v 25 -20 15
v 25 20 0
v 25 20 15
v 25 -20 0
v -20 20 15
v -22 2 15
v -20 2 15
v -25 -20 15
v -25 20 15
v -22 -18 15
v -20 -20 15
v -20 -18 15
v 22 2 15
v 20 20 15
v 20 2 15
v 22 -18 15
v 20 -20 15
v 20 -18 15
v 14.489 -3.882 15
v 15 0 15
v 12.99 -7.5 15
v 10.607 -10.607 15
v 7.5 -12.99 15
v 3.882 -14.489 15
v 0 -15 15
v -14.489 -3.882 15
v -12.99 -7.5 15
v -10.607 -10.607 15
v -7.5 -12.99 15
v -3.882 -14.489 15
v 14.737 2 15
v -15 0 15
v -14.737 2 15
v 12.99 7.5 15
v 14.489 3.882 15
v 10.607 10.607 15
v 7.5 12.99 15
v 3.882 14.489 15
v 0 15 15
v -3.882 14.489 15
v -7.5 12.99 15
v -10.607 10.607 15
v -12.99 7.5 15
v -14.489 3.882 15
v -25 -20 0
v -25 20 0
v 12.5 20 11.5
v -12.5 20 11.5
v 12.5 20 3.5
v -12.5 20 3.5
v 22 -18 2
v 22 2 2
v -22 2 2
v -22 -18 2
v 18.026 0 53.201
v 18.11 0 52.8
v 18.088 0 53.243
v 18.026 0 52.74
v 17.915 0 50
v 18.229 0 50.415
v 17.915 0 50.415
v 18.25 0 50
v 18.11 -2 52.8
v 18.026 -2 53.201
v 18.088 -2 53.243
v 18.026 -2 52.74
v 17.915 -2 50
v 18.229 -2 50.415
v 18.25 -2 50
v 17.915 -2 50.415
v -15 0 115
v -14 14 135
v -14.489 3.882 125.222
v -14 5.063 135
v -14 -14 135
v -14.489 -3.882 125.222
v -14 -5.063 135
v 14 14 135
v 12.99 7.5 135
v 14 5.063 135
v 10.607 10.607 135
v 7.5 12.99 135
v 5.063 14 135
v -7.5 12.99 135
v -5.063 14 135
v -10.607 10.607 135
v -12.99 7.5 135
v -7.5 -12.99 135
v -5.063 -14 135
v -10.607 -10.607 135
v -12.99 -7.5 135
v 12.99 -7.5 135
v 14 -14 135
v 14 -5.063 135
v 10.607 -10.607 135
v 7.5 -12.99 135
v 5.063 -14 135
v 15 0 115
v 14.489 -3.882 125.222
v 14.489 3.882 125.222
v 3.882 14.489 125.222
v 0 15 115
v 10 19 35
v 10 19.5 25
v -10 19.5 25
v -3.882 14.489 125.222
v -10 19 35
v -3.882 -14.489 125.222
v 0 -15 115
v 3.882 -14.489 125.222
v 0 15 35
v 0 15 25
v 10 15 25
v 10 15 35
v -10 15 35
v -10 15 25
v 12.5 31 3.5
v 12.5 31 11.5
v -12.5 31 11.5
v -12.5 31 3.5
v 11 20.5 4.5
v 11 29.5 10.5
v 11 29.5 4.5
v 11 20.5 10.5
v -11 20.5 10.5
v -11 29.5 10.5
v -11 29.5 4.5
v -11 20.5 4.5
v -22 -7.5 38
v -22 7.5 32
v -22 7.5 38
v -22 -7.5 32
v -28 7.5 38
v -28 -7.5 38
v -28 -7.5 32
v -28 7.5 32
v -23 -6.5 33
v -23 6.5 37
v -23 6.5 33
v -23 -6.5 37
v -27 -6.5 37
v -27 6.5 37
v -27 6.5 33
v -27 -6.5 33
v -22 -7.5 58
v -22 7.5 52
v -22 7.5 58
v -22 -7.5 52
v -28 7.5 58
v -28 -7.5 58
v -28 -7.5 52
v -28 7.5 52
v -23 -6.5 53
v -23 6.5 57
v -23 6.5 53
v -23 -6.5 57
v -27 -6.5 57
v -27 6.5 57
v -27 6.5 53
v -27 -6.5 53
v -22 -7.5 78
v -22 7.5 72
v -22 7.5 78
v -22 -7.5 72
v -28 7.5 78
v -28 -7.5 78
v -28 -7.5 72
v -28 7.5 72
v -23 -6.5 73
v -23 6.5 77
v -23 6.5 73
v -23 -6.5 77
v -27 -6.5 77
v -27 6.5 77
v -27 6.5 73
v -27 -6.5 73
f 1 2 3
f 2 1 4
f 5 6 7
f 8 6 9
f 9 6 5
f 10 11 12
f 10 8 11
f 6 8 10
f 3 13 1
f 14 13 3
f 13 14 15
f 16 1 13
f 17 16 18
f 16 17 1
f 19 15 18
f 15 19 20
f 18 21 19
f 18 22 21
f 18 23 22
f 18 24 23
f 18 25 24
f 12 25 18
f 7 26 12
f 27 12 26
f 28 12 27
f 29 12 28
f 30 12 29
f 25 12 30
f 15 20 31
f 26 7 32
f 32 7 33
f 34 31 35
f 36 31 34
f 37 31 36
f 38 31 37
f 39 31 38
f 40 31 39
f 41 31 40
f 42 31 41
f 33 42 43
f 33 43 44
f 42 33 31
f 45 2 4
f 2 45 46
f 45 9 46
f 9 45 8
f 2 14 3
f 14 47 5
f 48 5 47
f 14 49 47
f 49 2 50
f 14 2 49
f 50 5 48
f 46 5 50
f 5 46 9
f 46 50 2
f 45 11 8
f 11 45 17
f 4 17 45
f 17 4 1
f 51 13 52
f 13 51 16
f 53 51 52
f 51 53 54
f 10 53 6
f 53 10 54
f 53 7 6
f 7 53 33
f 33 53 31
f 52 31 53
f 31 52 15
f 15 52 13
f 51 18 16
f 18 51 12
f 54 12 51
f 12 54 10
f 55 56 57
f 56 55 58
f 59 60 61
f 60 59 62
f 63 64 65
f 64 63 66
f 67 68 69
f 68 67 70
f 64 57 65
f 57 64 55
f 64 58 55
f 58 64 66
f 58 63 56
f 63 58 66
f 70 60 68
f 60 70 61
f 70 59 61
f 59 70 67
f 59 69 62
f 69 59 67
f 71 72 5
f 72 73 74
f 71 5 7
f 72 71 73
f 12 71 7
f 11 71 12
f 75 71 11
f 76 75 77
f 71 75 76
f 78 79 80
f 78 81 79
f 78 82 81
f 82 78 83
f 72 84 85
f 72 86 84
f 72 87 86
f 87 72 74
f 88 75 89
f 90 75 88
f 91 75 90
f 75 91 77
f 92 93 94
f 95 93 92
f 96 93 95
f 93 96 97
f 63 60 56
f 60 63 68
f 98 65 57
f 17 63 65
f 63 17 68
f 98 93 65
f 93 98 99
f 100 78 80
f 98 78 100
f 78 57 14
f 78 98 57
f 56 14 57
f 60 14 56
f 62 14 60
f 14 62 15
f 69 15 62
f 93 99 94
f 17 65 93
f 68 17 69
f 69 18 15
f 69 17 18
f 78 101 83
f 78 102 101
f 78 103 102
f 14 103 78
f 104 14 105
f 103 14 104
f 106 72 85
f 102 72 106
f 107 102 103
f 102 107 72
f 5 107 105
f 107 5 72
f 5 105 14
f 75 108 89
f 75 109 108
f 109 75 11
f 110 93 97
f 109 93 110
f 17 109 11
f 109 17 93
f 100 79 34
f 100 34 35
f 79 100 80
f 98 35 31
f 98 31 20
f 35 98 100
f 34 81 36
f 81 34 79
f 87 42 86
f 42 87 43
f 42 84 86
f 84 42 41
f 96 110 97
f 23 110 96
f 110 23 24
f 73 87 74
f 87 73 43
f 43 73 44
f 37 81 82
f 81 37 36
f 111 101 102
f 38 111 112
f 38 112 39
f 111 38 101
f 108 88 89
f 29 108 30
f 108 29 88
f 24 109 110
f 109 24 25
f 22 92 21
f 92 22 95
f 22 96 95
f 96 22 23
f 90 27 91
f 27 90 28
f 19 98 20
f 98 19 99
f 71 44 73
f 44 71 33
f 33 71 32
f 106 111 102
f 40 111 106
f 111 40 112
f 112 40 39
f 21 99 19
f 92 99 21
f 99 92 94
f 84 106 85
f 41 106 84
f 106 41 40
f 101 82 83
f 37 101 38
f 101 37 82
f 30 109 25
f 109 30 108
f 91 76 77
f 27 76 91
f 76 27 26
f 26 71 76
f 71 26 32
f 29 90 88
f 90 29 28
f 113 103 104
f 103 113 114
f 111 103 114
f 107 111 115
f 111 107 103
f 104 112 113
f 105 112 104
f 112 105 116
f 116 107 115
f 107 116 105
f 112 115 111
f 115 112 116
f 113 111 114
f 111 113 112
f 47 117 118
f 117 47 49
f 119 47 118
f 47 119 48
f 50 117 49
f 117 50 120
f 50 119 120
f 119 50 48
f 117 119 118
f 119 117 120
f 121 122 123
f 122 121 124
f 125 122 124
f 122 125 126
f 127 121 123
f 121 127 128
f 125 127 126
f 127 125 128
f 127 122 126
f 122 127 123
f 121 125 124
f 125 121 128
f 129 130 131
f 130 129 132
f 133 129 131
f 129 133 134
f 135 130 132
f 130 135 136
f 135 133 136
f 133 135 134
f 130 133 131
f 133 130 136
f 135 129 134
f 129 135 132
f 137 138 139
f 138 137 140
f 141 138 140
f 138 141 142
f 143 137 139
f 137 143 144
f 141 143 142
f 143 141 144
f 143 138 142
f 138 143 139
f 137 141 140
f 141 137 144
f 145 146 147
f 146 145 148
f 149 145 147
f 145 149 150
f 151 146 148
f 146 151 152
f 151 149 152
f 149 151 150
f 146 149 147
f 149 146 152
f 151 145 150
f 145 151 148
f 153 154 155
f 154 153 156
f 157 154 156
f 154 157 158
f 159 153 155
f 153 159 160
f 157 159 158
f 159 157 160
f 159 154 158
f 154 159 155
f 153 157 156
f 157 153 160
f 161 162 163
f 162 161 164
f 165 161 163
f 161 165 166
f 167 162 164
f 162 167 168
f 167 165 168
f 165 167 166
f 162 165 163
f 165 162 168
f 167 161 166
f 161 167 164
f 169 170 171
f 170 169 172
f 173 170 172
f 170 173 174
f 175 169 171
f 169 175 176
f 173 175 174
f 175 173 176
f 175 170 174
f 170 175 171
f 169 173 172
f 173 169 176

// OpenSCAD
// SIMPLE WORKING DICE TOWER + INITIATIVE TRACKER
// Basic, guaranteed-to-work design

// Basic dimensions
TOWER_HEIGHT = 120;
BASE_SIZE = 40;
BASE_HEIGHT = 15;
DICE_PATH = 30;  // Internal diameter for dice

$fn = 24; // Low resolution for fast preview

module simple_base() {
    difference() {
        // Simple rectangular base
        cube([50, 40, BASE_HEIGHT], center=true);
        
        // Storage cavity
        translate([0, -8, 2])
            cube([44, 20, BASE_HEIGHT], center=true);
    }
}

module simple_tower() {
    difference() {
        // Simple tapered tower - NO HULL, just basic shapes
        translate([0, 0, 0])
            linear_extrude(height=TOWER_HEIGHT, scale=0.7)
                square([BASE_SIZE, BASE_SIZE], center=true);
        
        // Simple cylindrical dice path
        translate([0, 0, -1])
            cylinder(h=TOWER_HEIGHT + 2, r=DICE_PATH/2);
        
        // Simple exit hole
        translate([0, BASE_SIZE/2, 15])
            cube([20, 10, 10], center=true);
        
        // Initiative number cuts - SIMPLE
        for (i = [1:4]) {
            translate([BASE_SIZE/2 - 1, 0, 15 + i*20])
                rotate([90, 0, 0])
                    linear_extrude(height=2)
                        text(str(i), size=4, halign="center");
        }
    }
}

module simple_dice_tray() {
    translate([0, 25, 0]) {
        difference() {
            cube([25, 12, 8], center=true);
            cube([22, 9, 6], center=true);
        }
    }
}

module simple_baffle(z, angle) {
    translate([0, 0, z]) {
        rotate([0, 0, angle]) {
            translate([8, 0, 0])
                cube([6, 12, 1.5], center=true);
        }
    }
}

// MAIN ASSEMBLY - KEEP IT SIMPLE
difference() {
    union() {
        // Base
        translate([0, 0, BASE_HEIGHT/2])
            simple_base();
        
        // Tower
        translate([0, 0, BASE_HEIGHT])
            simple_tower();
        
        // Dice tray
        translate([0, 0, BASE_HEIGHT/2])
            simple_dice_tray();
    }
    
    // Subtract baffles from the whole thing
    translate([0, 0, BASE_HEIGHT]) {
        for (i = [0:3]) {
            simple_baffle(20 + i*20, i*60);
        }
    }
}

// Simple initiative plaques
for (i = [0:2]) {
    translate([-25, 0, BASE_HEIGHT + 20 + i*20]) {
        difference() {
            cube([6, 15, 6], center=true);
            cube([4, 13, 4], center=true);
        }
    }
}
